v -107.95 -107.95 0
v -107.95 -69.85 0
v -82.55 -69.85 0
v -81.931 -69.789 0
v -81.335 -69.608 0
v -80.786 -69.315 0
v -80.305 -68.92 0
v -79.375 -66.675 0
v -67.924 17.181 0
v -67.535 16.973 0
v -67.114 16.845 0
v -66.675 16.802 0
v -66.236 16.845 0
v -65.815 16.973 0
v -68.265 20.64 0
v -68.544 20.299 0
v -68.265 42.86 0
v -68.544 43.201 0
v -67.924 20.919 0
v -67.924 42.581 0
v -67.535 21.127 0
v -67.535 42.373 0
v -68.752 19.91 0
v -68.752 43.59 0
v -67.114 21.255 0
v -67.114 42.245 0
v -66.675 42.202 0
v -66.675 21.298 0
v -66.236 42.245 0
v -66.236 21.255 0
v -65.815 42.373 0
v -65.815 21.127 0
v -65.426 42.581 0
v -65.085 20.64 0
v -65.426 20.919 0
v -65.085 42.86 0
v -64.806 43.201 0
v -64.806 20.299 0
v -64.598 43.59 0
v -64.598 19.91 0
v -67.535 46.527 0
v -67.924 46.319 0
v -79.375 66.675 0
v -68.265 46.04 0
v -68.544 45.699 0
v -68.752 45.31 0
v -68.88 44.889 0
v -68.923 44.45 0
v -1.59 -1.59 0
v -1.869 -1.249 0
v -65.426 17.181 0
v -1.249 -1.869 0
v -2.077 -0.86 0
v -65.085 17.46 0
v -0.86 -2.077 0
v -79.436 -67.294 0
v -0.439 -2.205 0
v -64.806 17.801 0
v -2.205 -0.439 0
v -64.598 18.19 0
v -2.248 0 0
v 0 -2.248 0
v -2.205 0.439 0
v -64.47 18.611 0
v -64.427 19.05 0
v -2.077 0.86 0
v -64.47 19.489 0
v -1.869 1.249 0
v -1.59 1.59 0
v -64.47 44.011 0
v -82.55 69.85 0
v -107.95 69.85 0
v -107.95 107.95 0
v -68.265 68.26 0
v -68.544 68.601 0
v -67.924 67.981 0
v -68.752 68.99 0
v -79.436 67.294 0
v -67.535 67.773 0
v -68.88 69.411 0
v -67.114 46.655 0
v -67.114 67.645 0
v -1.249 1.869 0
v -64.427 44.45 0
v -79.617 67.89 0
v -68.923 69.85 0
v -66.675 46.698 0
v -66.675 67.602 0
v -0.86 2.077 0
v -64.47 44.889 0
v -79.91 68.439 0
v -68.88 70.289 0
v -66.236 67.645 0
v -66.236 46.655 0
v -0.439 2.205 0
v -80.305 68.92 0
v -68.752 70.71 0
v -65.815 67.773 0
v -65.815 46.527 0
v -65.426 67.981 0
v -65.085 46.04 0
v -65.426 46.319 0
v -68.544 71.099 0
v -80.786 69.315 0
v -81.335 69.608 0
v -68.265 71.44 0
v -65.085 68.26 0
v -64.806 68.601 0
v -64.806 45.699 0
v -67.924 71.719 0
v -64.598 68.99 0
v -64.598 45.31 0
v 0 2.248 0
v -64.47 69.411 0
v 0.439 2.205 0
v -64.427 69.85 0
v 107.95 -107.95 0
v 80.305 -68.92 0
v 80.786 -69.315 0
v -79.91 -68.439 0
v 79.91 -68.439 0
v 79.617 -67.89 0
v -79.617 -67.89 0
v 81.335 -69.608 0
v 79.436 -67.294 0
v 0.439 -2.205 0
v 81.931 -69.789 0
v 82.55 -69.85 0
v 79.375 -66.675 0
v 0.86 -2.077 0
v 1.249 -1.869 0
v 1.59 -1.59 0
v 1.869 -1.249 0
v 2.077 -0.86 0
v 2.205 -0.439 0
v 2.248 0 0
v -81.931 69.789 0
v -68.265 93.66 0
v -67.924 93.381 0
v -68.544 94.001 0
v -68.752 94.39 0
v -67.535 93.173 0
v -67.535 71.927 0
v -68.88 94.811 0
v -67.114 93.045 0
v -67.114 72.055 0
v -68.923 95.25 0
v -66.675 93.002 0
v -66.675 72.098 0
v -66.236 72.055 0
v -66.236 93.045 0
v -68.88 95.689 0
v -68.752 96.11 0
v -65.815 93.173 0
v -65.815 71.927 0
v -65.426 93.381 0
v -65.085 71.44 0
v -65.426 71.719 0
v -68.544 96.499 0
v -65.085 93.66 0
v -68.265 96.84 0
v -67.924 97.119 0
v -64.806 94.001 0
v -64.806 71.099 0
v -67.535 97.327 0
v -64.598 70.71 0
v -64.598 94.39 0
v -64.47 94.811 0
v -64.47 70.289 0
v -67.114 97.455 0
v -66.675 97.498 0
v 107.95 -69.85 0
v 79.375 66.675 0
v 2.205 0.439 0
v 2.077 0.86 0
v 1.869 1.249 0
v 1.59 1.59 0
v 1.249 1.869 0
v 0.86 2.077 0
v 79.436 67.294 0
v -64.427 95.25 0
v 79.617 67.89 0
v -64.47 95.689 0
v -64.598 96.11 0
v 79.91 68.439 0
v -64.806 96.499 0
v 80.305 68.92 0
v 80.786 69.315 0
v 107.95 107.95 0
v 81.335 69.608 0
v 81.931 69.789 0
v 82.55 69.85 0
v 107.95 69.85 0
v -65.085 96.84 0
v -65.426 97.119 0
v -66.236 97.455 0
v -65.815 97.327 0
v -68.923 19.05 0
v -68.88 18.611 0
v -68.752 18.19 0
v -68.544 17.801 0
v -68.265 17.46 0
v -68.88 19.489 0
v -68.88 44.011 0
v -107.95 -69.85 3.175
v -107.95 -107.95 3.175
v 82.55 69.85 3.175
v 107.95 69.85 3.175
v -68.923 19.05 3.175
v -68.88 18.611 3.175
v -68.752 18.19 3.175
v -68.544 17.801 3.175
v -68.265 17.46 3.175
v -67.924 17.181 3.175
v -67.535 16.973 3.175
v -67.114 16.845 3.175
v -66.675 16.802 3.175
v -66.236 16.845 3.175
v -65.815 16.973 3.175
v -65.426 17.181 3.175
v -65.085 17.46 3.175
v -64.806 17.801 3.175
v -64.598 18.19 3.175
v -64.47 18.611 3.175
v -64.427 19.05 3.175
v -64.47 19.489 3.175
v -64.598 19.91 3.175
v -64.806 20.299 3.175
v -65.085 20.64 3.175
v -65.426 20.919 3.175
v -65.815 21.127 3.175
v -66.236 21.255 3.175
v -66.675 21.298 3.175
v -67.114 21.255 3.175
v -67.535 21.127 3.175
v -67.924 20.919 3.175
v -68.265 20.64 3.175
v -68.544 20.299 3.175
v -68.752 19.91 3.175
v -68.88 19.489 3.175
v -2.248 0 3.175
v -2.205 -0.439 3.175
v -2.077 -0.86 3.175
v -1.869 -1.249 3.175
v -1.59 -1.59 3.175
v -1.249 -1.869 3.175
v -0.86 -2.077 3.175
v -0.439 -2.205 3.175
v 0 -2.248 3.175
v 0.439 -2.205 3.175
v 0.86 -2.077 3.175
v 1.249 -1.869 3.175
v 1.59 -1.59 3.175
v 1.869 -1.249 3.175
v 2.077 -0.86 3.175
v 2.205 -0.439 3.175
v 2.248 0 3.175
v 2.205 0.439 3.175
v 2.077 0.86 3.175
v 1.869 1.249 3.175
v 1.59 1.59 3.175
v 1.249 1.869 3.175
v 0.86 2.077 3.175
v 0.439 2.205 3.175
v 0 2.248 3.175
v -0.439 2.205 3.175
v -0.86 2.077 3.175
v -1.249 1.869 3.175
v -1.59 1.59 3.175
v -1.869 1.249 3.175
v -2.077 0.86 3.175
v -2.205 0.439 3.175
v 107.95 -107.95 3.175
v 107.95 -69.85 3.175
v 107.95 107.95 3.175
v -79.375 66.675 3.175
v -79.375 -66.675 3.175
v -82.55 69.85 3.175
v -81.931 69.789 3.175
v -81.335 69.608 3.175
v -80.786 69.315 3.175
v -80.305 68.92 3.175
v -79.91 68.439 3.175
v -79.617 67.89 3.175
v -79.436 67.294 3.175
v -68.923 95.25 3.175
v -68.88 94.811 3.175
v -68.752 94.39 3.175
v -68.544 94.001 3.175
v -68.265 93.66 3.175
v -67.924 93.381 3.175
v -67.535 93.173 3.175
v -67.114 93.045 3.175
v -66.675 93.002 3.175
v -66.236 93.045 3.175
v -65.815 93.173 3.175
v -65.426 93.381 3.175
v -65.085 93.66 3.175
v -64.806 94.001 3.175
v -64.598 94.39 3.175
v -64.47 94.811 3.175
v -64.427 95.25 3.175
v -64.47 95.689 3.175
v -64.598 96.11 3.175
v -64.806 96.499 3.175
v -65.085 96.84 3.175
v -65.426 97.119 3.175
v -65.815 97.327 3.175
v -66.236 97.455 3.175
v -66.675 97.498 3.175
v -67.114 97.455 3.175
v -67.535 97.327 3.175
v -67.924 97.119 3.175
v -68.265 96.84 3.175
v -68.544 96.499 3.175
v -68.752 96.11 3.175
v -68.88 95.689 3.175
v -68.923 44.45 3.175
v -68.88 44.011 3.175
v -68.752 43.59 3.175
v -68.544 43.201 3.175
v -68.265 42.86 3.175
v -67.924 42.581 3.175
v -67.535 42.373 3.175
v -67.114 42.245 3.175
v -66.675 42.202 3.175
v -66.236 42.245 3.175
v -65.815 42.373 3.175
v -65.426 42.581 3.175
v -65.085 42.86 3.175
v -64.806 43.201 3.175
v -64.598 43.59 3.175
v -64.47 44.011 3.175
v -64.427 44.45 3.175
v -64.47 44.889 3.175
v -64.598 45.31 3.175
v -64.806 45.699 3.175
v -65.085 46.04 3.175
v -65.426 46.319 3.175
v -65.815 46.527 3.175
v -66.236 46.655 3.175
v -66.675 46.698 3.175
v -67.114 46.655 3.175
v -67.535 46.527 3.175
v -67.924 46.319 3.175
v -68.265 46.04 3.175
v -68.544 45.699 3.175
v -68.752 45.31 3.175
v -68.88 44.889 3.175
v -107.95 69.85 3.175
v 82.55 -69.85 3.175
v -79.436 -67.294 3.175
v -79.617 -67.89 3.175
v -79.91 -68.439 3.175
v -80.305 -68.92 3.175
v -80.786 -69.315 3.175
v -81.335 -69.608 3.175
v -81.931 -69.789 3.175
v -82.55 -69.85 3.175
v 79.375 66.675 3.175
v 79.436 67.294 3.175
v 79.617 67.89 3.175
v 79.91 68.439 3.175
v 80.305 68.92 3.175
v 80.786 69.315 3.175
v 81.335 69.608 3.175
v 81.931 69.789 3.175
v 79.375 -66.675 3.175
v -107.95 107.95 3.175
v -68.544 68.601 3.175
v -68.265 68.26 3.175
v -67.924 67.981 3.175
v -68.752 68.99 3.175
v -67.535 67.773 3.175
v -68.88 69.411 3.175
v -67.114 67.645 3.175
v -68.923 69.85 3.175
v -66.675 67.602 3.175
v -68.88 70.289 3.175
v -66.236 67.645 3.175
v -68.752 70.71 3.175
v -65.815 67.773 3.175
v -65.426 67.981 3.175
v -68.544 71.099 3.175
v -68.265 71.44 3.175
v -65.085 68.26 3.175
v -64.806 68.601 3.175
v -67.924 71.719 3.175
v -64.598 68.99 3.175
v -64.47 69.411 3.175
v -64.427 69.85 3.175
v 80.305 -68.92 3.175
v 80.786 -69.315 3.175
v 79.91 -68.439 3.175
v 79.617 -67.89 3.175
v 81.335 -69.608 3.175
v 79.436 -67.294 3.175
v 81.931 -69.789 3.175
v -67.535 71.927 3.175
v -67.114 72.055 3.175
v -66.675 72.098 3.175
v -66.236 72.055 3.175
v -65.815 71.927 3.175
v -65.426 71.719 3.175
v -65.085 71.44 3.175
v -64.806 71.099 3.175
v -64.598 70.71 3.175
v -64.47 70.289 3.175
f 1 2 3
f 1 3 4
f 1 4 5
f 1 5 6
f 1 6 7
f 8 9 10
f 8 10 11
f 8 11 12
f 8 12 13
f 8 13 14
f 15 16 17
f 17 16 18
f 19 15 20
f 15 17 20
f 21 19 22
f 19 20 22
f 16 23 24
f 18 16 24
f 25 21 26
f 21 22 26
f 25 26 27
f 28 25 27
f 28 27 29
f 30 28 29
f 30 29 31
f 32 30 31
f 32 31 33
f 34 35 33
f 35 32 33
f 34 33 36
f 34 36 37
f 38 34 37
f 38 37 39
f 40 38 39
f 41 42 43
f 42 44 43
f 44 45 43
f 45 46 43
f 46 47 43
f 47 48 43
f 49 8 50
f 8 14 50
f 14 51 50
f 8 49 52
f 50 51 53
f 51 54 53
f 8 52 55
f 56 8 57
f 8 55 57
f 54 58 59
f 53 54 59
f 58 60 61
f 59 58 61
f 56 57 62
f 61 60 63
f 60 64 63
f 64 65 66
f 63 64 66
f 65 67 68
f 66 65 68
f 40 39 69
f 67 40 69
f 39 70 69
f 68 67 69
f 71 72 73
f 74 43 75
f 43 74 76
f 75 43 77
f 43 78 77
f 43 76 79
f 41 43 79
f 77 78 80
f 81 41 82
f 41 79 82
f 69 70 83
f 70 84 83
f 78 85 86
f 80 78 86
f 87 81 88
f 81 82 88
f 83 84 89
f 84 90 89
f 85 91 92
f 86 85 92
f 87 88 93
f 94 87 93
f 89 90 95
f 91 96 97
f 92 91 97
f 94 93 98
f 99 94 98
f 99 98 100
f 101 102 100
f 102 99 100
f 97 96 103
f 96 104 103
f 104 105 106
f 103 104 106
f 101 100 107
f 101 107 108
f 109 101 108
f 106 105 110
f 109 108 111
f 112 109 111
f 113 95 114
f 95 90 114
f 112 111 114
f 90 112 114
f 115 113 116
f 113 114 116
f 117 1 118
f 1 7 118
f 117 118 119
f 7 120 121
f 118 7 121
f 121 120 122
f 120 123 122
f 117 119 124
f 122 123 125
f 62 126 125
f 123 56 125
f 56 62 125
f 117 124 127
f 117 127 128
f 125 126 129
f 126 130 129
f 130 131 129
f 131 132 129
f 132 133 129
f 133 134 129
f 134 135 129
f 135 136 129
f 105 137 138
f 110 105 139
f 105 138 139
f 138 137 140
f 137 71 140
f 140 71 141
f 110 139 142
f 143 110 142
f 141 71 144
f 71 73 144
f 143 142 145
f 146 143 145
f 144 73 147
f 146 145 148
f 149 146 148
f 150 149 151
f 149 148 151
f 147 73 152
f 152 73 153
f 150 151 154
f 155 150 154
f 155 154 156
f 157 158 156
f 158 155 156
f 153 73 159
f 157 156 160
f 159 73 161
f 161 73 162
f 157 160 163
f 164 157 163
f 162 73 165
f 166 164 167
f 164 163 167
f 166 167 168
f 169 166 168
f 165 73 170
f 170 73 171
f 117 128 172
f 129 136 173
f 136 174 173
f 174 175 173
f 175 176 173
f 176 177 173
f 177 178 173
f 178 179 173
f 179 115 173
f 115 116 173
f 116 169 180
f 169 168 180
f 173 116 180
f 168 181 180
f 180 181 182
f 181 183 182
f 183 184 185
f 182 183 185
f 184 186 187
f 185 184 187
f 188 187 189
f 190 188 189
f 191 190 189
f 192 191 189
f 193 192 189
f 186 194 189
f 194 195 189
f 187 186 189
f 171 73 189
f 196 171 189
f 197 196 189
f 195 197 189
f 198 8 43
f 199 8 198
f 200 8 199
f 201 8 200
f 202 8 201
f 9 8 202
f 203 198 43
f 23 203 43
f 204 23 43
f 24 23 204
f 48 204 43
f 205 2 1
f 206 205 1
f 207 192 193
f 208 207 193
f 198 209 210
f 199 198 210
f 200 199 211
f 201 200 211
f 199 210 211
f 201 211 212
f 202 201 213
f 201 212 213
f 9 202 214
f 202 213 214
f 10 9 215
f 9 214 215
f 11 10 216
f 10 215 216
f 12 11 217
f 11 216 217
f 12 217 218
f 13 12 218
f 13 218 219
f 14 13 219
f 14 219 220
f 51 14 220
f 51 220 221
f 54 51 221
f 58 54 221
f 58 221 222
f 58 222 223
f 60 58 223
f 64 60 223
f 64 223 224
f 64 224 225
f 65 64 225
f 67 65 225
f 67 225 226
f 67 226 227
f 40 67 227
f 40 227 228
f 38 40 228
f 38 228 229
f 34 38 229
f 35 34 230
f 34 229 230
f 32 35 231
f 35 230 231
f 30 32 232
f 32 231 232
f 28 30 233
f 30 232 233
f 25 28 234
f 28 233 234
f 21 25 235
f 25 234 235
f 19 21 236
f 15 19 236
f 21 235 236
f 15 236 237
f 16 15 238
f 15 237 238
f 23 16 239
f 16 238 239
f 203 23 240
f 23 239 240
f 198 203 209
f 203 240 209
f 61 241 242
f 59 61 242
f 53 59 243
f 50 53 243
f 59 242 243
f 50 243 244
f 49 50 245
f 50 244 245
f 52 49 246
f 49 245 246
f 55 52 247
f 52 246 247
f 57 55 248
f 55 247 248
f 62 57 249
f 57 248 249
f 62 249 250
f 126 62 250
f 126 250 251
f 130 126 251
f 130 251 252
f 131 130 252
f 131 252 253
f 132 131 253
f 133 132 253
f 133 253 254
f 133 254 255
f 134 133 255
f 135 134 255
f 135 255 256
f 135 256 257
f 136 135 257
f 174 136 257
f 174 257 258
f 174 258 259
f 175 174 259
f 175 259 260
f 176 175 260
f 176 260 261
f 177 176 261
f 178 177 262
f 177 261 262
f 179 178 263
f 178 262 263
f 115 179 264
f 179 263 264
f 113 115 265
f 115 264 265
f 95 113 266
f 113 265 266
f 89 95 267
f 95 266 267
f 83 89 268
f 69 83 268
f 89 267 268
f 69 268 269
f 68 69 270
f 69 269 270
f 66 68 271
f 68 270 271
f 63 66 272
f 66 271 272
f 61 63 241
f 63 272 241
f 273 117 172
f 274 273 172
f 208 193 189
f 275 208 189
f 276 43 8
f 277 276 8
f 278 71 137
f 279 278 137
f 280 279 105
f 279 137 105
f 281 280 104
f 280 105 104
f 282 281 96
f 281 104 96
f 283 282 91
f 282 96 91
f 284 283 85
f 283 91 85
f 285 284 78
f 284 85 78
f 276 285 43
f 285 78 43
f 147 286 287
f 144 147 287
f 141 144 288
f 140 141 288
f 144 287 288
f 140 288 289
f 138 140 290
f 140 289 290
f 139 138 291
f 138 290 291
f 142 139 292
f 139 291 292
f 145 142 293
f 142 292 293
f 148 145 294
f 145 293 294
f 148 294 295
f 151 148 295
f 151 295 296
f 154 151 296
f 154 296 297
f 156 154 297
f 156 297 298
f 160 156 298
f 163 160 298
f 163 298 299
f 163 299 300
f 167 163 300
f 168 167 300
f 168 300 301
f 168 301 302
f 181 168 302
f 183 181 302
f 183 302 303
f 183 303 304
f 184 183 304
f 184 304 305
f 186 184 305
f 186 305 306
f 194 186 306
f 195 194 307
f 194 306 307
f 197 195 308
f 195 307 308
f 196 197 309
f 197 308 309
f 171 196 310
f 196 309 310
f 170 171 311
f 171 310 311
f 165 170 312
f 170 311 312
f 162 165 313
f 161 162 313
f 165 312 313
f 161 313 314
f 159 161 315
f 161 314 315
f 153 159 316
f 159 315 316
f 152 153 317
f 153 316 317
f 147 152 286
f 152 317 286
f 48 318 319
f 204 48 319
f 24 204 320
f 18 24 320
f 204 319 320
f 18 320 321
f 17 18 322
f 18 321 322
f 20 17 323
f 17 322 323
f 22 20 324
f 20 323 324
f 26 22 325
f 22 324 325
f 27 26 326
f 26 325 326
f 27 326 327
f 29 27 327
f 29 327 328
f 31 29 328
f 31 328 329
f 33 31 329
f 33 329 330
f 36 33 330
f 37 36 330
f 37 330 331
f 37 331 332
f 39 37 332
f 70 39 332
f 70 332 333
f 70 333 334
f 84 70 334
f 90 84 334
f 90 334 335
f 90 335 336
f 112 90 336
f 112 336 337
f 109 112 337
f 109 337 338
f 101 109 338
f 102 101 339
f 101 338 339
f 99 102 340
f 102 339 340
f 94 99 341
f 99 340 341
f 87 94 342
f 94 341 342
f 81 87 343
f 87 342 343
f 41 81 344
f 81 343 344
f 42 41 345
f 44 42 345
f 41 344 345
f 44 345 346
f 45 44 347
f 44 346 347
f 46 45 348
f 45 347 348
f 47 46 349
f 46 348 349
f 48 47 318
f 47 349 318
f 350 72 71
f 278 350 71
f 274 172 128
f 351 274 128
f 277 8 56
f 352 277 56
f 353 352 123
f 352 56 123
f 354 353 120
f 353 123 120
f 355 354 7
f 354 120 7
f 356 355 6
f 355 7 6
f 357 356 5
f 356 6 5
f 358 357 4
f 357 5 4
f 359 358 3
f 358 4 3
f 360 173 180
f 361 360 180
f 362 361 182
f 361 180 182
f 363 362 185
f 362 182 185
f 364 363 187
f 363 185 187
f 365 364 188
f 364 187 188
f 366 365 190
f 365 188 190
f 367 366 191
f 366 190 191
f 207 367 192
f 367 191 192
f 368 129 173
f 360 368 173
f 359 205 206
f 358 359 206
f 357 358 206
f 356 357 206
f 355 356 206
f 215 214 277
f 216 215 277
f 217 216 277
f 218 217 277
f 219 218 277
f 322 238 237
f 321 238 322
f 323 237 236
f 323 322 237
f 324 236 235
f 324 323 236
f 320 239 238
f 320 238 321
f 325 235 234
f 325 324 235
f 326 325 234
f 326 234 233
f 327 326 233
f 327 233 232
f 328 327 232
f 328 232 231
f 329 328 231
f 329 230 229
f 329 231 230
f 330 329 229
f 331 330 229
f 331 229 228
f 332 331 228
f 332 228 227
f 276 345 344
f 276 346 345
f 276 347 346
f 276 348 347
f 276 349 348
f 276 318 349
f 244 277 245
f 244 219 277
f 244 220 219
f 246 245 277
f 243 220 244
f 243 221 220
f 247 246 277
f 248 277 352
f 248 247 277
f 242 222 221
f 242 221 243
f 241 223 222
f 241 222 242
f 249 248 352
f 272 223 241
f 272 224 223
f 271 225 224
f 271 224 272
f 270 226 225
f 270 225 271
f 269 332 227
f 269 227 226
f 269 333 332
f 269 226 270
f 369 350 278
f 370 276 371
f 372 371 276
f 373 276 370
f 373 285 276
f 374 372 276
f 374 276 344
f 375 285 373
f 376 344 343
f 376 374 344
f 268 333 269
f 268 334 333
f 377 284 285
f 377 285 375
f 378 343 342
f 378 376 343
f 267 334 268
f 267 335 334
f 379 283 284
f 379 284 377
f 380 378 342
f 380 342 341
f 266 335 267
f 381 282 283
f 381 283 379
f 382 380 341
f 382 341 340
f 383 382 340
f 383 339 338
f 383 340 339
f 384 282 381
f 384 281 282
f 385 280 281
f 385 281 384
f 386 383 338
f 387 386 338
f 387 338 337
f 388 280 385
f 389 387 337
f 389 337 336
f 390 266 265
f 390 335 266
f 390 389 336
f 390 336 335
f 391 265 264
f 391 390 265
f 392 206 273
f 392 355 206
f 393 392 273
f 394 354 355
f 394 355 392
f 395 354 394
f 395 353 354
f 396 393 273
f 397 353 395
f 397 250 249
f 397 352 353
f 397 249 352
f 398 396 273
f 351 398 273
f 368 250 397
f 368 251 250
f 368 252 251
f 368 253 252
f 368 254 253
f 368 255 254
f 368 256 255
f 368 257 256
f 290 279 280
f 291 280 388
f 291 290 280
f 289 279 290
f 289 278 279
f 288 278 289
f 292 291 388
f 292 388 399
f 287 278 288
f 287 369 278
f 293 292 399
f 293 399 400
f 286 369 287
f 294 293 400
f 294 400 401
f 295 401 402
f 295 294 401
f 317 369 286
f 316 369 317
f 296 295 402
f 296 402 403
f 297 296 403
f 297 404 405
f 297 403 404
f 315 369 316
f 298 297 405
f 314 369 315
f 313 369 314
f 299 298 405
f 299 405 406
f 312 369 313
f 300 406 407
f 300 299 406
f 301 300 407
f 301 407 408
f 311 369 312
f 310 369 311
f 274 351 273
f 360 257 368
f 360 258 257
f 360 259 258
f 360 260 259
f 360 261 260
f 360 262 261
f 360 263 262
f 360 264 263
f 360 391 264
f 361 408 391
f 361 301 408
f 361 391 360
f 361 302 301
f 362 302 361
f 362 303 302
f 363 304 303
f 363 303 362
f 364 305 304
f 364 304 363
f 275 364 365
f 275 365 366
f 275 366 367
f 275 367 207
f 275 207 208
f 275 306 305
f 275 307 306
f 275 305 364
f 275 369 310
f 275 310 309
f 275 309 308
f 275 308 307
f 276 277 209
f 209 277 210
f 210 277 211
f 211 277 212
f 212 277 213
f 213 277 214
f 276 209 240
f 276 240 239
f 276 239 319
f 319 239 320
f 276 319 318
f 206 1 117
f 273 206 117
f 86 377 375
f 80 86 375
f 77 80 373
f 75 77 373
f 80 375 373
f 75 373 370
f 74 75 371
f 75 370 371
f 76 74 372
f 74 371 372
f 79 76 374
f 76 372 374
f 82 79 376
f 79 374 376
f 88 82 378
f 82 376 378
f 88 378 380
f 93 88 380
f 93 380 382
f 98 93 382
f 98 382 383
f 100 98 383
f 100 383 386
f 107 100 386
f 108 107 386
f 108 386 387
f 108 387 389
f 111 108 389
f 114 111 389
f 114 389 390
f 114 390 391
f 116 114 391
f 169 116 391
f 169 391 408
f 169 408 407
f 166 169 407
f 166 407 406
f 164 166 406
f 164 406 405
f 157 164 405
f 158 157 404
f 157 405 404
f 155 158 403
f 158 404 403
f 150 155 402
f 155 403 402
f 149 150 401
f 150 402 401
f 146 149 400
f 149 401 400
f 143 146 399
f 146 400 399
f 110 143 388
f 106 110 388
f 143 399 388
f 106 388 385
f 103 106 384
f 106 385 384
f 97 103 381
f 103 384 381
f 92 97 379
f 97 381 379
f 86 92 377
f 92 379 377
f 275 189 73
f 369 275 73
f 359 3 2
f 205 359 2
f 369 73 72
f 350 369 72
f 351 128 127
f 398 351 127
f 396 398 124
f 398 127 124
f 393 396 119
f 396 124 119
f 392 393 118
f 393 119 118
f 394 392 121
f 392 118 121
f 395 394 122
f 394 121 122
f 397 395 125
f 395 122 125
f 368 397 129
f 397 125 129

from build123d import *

# Parameters (mm, degrees)
F1_DEPTH = 3.175
F2_D     = 4.4958
F3_D     = 4.4958
F4_D     = 4.4958
F5_D     = 4.4958
F6_D     = 4.4958


with BuildPart() as f1:
    # F0 (on Top) → F1 (new body)
    with BuildSketch(Plane.XY):
        with BuildLine():
            Line((-107.95, -69.85), (-107.95, -107.95))
            Line((-107.95, -107.95), (107.95, -107.95))
            Line((107.95, -107.95), (107.95, -69.85))
            Line((107.95, -69.85), (82.55, -69.85))
            ThreePointArc((82.55, -69.85), (80.3049359697, -68.9200640303), (79.375, -66.675))
            Line((79.375, -66.675), (79.375, 66.675))
            ThreePointArc((79.375, 66.675), (80.3049359697, 68.9200640303), (82.55, 69.85))
            Line((82.55, 69.85), (107.95, 69.85))
            Line((107.95, 69.85), (107.95, 107.95))
            Line((107.95, 107.95), (-107.95, 107.95))
            Line((-107.95, 107.95), (-107.95, 69.85))
            Line((-107.95, 69.85), (-82.55, 69.85))
            ThreePointArc((-82.55, 69.85), (-80.3049359697, 68.9200640303), (-79.375, 66.675))
            Line((-79.375, 66.675), (-79.375, -66.675))
            ThreePointArc((-79.375, -66.675), (-80.3049359697, -68.9200640303), (-82.55, -69.85))
            Line((-82.55, -69.85), (-107.95, -69.85))
        make_face()
    extrude(amount=F1_DEPTH)

    # F2 (through all)
    with Locations(Plane(origin=(0, 0, 0), x_dir=(1, 0, 0), z_dir=(0, 0, -1))):
        with Locations((0, 0)):
            Hole(F2_D / 2)

    # F3 (through all)
    with Locations(Plane(origin=(0, 0, 0), x_dir=(1, 0, 0), z_dir=(0, 0, -1))):
        with Locations((-66.675, -95.25)):
            Hole(F3_D / 2)

    # F4 (through all)
    with Locations(Plane(origin=(0, 0, 0), x_dir=(1, 0, 0), z_dir=(0, 0, -1))):
        with Locations((-66.675, -69.85)):
            Hole(F4_D / 2)

    # F5 (through all)
    with Locations(Plane(origin=(0, 0, 0), x_dir=(1, 0, 0), z_dir=(0, 0, -1))):
        with Locations((-66.675, -44.45)):
            Hole(F5_D / 2)

    # F6 (through all)
    with Locations(Plane(origin=(0, 0, 0), x_dir=(1, 0, 0), z_dir=(0, 0, -1))):
        with Locations((-66.675, -19.05)):
            Hole(F6_D / 2)


solid = f1.part
